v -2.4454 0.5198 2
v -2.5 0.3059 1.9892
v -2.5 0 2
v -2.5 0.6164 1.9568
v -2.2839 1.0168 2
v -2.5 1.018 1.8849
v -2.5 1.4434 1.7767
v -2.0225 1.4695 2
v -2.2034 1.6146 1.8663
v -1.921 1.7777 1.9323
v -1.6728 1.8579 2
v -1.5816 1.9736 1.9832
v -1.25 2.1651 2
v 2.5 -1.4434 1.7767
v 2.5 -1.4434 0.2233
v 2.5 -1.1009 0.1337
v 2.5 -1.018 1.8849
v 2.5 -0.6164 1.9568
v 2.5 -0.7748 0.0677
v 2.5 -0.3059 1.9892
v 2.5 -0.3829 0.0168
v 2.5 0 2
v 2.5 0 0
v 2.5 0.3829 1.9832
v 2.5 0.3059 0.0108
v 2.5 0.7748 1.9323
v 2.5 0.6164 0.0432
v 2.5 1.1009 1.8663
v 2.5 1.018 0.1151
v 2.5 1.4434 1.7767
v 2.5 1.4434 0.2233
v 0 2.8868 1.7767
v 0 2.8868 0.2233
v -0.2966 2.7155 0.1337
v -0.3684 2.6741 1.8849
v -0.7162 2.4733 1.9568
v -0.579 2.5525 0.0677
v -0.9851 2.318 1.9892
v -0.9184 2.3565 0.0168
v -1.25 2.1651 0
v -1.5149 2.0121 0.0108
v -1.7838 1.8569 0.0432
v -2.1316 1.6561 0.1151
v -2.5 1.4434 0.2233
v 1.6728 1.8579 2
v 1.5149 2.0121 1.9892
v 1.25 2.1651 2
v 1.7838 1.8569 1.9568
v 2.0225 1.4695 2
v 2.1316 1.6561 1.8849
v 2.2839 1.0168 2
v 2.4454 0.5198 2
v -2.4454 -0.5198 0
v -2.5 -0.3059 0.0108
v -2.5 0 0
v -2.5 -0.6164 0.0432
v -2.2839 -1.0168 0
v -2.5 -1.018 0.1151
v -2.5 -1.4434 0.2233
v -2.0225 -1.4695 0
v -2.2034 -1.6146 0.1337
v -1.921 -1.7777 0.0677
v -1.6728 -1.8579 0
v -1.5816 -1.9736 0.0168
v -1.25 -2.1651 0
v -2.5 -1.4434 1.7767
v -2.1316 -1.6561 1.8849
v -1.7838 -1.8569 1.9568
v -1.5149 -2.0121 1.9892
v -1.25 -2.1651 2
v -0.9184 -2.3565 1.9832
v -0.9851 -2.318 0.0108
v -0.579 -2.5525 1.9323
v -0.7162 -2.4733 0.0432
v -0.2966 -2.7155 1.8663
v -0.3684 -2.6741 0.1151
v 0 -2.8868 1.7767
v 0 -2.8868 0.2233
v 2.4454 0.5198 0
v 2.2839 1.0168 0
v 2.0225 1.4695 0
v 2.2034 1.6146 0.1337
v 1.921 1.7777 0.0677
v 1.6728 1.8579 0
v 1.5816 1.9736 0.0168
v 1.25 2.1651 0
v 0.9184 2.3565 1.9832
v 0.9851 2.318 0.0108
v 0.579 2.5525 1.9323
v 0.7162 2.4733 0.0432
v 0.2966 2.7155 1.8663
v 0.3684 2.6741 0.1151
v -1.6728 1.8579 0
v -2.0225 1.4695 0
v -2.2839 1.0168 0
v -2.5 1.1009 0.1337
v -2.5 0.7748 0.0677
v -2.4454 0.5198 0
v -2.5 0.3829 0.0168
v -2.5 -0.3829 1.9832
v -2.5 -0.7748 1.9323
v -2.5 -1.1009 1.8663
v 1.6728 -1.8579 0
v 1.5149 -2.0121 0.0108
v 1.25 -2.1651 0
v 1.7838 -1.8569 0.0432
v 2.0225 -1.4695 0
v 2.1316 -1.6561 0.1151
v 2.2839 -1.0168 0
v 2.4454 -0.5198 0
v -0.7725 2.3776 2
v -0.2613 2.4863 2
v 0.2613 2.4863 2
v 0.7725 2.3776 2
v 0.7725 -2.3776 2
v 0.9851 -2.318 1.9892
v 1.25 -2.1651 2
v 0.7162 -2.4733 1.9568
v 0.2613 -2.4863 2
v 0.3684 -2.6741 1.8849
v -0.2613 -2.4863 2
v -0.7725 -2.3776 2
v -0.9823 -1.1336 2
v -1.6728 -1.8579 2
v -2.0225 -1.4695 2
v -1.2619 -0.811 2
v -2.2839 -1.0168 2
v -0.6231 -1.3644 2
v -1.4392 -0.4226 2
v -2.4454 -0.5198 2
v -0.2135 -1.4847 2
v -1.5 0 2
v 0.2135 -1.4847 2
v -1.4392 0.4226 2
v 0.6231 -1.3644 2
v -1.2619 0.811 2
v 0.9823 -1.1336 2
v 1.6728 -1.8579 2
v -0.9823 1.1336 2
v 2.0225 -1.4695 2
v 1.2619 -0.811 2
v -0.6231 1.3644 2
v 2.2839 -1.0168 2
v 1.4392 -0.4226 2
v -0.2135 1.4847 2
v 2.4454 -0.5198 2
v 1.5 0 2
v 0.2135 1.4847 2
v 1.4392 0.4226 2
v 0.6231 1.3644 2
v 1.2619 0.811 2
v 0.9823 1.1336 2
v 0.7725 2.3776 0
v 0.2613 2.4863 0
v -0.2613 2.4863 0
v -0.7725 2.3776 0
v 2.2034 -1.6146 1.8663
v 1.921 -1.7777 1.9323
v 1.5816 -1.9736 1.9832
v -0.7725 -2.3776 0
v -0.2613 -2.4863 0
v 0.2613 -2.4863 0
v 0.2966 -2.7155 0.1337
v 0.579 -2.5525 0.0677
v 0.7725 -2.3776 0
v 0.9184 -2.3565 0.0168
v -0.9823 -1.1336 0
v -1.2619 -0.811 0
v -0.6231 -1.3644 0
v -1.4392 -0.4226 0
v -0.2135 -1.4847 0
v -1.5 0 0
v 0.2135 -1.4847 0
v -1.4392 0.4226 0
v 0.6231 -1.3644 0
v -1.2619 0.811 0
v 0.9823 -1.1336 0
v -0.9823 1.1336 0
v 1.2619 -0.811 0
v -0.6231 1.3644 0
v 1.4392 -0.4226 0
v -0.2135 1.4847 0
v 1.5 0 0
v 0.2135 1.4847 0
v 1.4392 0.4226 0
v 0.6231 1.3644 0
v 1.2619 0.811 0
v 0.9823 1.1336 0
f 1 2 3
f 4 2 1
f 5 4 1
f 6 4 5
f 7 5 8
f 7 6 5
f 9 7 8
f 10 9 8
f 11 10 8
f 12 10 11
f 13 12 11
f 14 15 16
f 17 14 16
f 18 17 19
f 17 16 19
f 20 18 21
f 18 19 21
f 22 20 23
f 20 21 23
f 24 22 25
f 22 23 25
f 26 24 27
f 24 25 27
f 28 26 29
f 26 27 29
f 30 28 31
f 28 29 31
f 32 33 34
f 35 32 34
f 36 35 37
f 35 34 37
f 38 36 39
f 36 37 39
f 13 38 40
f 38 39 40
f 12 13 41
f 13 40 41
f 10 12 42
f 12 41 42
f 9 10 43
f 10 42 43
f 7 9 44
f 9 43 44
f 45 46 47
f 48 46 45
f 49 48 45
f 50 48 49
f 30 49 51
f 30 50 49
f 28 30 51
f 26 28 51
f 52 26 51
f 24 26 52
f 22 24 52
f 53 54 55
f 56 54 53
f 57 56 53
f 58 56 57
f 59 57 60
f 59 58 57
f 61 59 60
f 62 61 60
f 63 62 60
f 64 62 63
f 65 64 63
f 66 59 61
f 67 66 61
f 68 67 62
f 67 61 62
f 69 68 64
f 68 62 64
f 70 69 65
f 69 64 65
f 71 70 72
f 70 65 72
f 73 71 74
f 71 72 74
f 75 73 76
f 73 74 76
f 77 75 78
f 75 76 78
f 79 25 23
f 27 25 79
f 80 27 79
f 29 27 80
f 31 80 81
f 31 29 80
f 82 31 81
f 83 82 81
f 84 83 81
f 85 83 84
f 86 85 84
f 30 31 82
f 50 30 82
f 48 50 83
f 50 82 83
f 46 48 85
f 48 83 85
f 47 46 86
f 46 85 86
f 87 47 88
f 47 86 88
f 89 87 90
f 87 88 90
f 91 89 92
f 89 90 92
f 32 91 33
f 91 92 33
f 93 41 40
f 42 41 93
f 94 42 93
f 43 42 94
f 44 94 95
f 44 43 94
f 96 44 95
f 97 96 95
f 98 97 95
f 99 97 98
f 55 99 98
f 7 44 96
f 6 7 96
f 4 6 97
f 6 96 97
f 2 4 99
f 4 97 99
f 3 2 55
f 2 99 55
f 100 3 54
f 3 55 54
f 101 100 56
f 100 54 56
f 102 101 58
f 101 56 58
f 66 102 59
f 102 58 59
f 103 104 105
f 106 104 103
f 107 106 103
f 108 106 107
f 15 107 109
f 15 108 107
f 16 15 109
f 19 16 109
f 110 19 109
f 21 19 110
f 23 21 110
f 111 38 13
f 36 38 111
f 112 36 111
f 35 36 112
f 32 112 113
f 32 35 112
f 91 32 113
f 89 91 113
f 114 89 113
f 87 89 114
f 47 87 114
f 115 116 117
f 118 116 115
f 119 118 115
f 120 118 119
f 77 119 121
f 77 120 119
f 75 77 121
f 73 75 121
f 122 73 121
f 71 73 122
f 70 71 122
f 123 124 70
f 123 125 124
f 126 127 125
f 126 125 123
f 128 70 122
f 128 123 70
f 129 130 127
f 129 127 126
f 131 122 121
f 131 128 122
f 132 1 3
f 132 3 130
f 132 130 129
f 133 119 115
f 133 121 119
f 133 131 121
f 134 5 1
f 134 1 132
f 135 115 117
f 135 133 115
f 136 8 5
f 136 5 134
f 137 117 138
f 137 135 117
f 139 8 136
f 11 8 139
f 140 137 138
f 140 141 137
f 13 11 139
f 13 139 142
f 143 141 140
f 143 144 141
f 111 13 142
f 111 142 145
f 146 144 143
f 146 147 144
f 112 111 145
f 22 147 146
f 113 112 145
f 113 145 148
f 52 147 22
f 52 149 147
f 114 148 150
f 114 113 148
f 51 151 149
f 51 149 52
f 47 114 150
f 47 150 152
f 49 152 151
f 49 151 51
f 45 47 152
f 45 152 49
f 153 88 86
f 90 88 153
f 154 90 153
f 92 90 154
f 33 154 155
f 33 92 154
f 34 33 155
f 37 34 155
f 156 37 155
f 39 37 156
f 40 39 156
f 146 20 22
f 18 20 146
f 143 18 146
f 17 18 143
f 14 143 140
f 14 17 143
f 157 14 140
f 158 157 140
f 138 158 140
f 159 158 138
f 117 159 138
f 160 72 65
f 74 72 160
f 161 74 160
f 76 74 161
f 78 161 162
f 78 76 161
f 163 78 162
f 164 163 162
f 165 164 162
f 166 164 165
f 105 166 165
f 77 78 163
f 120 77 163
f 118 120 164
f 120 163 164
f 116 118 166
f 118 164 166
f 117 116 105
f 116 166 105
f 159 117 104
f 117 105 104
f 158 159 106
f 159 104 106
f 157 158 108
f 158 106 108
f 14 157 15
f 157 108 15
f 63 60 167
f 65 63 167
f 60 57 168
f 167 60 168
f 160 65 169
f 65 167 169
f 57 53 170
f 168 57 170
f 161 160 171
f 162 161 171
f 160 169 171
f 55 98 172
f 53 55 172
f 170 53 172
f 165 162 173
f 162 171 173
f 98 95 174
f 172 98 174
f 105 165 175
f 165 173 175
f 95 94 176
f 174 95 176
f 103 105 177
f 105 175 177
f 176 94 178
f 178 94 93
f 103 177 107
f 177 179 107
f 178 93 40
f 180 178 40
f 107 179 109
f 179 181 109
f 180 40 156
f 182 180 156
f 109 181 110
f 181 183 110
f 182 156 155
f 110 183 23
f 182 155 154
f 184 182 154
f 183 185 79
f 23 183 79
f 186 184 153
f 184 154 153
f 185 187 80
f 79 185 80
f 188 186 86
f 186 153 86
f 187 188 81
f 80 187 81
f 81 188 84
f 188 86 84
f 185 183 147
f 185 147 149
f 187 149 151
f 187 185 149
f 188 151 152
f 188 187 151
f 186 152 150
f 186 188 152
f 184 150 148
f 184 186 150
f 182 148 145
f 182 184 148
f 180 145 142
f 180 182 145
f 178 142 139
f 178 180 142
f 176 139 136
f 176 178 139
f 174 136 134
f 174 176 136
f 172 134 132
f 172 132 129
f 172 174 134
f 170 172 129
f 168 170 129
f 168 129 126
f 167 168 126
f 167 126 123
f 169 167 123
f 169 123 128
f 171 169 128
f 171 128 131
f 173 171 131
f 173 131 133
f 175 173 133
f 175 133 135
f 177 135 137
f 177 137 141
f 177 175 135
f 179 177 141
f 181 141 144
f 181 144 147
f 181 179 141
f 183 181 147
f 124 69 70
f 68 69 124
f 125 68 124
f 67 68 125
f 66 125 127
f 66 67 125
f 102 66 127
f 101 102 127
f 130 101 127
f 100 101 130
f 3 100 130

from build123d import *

# Parameters (mm, degrees)
SKETCH1_R           = 1.5
BOSS_EXTRUDE1_DEPTH = 2
SKETCH2_OUTSIDE_W   = 15.508
SKETCH2_OUTSIDE_H   = 16.282
SKETCH2_OUTSIDE_R   = 2.5
CUT_EXTRUDE1_DEPTH  = 2
CUT_EXTRUDE1_TAPER  = 60
SKETCH3_OUTSIDE_W   = 15.508
SKETCH3_OUTSIDE_H   = 16.282
SKETCH3_OUTSIDE_R   = 2.5
CUT_EXTRUDE2_DEPTH  = 2
CUT_EXTRUDE2_TAPER  = 60


with BuildPart() as part:
    # Sketch1 → Boss-Extrude1 (new body)
    with BuildSketch(Plane.XY):
        Polygon((0, -2.886751346), (2.5, -1.443375673), (2.5, 1.443375673), (0, 2.886751346), (-2.5, 1.443375673), (-2.5, -1.443375673), align=None)
        Circle(SKETCH1_R, mode=Mode.SUBTRACT)
    extrude(amount=BOSS_EXTRUDE1_DEPTH)

    # Sketch2 outside → Cut-Extrude1 (cut)
    with BuildSketch(Plane.XY.offset(2)):
        Rectangle(SKETCH2_OUTSIDE_W, SKETCH2_OUTSIDE_H)
        Circle(SKETCH2_OUTSIDE_R, mode=Mode.SUBTRACT)
    extrude(amount=-CUT_EXTRUDE1_DEPTH, taper=CUT_EXTRUDE1_TAPER, mode=Mode.SUBTRACT)

    # Sketch3 outside → Cut-Extrude2 (cut)
    with BuildSketch(Plane(origin=(0, 0, 0), x_dir=(-1, 0, 0), z_dir=(0, 0, -1))):
        Rectangle(SKETCH3_OUTSIDE_W, SKETCH3_OUTSIDE_H)
        Circle(SKETCH3_OUTSIDE_R, mode=Mode.SUBTRACT)
    extrude(amount=-CUT_EXTRUDE2_DEPTH, taper=CUT_EXTRUDE2_TAPER, mode=Mode.SUBTRACT)


solid = part.part
